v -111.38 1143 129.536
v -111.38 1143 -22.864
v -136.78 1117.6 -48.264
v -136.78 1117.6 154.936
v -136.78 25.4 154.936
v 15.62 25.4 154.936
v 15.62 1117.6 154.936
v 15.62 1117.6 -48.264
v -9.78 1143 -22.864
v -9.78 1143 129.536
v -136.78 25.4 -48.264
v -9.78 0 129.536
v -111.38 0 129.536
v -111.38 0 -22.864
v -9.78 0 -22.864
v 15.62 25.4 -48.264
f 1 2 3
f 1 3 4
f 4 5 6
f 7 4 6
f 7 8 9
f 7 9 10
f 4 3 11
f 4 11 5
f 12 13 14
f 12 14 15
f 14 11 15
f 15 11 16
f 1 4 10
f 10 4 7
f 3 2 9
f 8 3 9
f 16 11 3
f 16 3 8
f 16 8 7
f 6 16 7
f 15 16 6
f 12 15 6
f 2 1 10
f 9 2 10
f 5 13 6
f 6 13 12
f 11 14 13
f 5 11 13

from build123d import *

# Parameters (mm, degrees)
F0_W     = 152.4
F0_H     = 203.2
F1_DEPTH = 1143
F2_SIZE  = 25.4
F3_SIZE  = 25.4
F4_SIZE  = 25.4


with BuildPart() as f1:
    # F0 (on Front) → F1 (new body)
    with BuildSketch(Plane.XZ):
        with Locations((-60.580229, 53.336448)):
            Rectangle(F0_W, F0_H)
    extrude(amount=-F1_DEPTH)

    # F2
    f2_edges = [f1.edges().sort_by_distance(p)[0] for p in [
        (-60.580229, 0, 154.936448),
    ]]
    chamfer(f2_edges, length=F2_SIZE)

    # F3
    f3_edges = [f1.edges().sort_by_distance(p)[0] for p in [
        (-136.780229, 0, 40.636448),
        (-60.580229, 0, -48.263552),
        (15.619771, 0, 40.636448),
    ]]
    chamfer(f3_edges, length=F3_SIZE)

    # F4
    f4_edges = [f1.edges().sort_by_distance(p)[0] for p in [
        (-60.580229, 1143, 154.936448),
        (15.619771, 1143, 53.336448),
        (-60.580229, 1143, -48.263552),
        (-136.780229, 1143, 53.336448),
    ]]
    chamfer(f4_edges, length=F4_SIZE)


solid = f1.part
